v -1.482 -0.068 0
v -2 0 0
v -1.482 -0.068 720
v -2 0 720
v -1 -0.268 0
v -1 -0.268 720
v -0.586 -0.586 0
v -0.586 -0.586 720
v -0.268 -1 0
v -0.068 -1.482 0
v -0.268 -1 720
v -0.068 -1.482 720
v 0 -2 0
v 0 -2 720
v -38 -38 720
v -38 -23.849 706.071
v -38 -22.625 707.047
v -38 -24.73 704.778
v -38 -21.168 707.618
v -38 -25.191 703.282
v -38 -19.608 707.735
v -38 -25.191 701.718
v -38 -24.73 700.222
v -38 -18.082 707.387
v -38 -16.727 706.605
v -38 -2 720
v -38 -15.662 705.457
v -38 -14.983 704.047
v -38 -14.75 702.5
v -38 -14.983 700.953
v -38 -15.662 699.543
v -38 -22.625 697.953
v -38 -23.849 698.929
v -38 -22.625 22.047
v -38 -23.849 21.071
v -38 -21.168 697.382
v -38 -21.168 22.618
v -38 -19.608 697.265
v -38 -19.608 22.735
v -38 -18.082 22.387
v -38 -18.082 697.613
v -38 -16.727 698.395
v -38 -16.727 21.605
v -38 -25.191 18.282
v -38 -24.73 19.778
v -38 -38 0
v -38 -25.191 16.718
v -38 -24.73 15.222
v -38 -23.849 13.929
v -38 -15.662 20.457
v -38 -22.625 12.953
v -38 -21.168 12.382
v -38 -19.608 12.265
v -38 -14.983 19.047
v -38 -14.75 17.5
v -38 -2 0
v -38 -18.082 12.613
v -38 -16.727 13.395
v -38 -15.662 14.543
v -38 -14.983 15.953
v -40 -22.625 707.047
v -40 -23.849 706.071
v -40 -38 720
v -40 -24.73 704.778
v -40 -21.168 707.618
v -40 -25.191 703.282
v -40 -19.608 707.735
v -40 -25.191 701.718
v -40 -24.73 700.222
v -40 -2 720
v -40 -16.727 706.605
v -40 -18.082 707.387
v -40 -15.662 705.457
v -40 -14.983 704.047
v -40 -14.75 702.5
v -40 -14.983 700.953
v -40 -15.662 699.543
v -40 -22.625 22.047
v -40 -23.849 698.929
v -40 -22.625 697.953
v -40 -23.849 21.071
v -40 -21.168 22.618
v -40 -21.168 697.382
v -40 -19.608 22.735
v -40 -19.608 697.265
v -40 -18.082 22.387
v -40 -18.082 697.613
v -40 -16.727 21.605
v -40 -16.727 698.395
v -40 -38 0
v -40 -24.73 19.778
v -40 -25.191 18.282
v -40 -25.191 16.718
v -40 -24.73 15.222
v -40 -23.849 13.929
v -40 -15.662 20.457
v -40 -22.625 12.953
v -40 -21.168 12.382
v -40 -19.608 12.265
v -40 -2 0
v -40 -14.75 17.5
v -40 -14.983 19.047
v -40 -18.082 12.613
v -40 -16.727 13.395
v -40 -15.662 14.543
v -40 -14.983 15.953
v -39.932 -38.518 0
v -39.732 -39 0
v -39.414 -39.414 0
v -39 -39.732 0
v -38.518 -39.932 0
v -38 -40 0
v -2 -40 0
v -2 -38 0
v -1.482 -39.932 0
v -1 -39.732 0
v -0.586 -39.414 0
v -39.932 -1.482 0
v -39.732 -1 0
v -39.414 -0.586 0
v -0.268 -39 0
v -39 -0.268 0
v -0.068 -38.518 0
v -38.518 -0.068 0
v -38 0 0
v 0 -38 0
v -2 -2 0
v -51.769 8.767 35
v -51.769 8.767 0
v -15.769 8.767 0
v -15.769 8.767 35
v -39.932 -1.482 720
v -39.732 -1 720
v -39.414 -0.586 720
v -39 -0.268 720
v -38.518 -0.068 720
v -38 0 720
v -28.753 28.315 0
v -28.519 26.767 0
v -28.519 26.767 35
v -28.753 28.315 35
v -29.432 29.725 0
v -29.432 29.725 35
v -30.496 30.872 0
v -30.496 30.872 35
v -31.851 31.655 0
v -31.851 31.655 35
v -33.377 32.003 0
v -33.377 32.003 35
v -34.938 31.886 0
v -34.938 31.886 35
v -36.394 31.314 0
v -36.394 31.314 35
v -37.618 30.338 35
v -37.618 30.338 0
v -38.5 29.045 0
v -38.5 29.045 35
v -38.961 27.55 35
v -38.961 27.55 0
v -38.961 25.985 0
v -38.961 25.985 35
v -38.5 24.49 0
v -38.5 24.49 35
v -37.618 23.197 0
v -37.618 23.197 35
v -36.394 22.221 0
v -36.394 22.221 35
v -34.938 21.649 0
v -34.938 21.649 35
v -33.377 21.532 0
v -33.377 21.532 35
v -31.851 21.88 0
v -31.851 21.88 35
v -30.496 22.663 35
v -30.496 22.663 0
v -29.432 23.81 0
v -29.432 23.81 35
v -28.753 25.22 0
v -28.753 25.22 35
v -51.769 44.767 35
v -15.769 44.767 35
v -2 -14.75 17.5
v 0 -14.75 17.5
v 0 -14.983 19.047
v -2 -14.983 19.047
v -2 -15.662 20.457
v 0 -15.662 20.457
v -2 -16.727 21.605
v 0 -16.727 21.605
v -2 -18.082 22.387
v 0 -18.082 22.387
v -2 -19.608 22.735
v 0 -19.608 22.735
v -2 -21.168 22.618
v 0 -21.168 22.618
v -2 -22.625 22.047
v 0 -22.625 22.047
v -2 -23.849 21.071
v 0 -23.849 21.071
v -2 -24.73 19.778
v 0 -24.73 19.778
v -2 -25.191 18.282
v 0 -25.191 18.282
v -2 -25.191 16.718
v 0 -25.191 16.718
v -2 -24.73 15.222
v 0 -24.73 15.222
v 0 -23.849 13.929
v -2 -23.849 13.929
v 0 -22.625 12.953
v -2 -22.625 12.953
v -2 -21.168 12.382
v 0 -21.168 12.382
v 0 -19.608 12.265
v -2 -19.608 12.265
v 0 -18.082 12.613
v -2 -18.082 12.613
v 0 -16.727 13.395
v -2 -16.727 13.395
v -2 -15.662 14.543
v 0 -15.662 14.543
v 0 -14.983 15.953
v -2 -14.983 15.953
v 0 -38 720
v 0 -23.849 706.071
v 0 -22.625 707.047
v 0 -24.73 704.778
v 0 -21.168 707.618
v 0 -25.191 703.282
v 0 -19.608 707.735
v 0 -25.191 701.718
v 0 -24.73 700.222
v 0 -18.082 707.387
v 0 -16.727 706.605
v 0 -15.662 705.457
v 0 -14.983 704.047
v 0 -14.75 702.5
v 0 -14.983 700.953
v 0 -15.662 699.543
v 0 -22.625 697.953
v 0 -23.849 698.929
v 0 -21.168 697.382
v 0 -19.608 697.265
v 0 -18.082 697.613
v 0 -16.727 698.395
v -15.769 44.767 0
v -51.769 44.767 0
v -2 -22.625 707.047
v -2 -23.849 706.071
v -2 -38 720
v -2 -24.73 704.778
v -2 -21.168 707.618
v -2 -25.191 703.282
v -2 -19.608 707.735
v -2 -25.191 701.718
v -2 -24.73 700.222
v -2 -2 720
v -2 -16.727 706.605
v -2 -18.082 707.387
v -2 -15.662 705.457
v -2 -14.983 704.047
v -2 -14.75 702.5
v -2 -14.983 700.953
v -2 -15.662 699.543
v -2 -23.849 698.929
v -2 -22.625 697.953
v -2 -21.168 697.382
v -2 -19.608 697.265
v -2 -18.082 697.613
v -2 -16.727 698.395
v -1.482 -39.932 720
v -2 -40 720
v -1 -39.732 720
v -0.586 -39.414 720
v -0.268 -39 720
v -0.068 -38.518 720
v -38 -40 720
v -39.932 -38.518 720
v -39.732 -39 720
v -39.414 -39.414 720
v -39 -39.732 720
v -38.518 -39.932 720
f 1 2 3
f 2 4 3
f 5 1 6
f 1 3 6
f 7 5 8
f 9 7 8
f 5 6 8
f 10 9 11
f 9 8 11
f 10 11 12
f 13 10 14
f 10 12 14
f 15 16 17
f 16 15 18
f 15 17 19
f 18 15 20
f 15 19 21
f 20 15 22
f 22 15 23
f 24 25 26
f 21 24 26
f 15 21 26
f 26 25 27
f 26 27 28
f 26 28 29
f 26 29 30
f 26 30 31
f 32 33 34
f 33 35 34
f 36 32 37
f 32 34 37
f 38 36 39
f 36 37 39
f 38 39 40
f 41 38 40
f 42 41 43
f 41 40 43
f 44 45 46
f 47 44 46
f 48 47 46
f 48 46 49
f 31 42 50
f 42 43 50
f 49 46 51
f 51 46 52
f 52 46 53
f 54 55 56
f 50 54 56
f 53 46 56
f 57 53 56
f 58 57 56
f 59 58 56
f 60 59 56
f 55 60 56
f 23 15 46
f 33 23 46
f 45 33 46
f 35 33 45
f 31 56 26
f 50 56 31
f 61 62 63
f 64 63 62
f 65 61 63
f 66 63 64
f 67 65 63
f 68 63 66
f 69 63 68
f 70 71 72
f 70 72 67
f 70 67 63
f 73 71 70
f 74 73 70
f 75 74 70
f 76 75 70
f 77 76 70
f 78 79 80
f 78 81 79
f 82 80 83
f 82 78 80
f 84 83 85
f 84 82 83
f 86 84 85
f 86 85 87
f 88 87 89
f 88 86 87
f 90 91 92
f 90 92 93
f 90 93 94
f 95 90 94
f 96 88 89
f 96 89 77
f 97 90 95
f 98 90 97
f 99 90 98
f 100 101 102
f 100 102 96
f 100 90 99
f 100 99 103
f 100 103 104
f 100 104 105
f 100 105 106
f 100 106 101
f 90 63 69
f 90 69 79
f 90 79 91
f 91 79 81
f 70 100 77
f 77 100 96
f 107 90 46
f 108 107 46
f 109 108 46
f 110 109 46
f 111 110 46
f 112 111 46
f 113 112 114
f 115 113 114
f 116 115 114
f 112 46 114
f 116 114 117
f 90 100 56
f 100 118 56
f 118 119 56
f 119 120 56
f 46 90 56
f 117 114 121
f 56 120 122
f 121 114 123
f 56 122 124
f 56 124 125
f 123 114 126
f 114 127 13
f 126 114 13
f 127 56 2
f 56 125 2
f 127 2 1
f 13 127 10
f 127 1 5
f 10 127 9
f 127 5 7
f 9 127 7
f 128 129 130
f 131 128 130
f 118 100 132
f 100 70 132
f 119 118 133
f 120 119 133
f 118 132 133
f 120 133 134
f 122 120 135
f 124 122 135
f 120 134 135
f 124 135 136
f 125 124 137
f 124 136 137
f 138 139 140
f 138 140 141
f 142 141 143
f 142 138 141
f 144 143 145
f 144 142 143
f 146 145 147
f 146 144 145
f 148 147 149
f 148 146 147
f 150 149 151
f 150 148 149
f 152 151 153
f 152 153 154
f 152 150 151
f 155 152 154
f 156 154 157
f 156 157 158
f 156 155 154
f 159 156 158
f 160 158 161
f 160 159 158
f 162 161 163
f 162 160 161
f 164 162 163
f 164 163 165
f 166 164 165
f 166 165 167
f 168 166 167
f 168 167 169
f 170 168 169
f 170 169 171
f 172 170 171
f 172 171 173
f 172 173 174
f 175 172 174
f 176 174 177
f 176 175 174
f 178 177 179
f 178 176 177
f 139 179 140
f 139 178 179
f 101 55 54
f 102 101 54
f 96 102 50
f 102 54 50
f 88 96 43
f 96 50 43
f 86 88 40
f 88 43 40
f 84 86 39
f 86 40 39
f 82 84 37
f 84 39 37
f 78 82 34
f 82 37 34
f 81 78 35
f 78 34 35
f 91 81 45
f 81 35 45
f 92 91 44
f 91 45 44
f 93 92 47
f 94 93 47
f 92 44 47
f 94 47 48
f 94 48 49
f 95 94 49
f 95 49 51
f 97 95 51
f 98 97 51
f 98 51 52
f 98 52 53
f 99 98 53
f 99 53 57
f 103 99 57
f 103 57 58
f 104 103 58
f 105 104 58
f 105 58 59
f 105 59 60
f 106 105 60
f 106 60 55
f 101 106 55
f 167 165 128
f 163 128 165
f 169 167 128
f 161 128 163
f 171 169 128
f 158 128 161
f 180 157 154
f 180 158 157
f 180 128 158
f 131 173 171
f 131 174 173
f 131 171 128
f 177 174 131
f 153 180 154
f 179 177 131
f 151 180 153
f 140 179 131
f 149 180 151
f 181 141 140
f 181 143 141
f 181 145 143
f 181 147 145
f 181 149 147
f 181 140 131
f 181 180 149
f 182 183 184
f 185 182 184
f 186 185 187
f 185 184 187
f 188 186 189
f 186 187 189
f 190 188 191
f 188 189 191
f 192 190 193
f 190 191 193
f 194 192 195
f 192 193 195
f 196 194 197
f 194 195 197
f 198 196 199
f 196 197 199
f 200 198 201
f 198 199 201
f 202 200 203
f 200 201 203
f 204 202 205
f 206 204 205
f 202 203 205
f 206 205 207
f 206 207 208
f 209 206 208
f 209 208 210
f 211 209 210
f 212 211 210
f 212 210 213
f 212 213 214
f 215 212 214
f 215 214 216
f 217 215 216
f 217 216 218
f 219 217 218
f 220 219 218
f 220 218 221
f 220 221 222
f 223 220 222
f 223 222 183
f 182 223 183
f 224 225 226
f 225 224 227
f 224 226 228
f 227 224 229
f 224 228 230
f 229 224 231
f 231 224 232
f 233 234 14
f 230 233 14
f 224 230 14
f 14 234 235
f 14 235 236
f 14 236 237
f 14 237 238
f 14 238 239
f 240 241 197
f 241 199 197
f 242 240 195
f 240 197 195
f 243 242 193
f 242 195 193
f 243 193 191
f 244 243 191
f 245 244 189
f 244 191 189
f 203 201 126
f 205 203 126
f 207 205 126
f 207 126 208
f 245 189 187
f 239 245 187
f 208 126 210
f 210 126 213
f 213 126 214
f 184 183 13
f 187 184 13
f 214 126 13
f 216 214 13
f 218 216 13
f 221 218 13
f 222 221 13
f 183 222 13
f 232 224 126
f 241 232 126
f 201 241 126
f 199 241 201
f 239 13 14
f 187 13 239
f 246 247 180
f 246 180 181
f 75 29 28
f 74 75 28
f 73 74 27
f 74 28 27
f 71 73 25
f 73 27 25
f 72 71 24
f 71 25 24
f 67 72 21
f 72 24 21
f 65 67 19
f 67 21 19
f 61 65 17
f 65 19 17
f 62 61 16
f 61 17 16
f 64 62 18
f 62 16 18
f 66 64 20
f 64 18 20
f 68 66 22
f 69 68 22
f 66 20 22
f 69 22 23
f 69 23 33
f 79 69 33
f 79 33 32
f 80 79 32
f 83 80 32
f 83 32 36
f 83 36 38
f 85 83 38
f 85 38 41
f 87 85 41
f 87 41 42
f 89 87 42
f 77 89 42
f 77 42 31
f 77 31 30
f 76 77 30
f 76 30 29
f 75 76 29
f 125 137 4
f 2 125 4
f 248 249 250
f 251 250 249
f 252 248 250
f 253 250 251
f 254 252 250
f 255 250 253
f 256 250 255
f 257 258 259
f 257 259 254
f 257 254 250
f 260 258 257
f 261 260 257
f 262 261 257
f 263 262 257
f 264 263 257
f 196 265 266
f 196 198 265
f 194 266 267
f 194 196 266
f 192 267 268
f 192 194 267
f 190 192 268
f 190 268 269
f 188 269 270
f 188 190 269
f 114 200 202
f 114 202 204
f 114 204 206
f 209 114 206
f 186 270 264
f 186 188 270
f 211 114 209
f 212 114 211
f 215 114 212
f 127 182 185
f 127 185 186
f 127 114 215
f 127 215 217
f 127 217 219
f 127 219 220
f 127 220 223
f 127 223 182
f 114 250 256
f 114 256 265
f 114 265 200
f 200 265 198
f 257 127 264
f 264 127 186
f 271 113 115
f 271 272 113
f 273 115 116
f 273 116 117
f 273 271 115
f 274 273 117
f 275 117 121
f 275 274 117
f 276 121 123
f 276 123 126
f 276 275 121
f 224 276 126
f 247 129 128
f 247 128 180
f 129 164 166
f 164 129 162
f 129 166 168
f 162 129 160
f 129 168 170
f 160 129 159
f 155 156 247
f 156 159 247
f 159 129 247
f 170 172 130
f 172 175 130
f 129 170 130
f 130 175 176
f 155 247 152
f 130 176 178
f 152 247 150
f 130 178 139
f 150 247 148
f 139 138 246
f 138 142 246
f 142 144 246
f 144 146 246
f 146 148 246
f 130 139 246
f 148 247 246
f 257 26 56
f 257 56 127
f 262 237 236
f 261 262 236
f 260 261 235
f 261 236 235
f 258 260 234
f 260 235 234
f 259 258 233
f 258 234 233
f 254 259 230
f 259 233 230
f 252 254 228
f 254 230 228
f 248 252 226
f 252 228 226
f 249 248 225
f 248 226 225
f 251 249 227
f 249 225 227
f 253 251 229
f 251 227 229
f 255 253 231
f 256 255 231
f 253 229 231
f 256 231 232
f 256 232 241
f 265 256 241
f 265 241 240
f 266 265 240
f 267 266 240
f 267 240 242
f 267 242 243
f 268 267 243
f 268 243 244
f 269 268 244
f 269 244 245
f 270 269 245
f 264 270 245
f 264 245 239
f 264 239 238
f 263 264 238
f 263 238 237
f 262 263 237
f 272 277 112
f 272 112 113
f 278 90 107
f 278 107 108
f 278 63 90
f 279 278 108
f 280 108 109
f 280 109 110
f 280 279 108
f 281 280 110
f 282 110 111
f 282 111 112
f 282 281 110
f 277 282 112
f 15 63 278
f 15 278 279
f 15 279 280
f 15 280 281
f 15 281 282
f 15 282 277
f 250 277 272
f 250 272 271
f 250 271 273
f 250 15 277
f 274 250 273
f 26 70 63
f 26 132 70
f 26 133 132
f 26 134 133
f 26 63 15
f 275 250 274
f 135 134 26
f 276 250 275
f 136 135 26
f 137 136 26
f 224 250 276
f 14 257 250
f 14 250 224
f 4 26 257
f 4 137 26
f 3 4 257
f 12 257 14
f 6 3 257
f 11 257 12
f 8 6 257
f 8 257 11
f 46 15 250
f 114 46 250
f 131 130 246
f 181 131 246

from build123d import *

# Parameters (mm, degrees)
F0_W     = 40
F0_H     = 40
F0_W_2   = 36
F0_H_2   = 36
F1_DEPTH = 720
F2_W     = 36
F2_H     = 36
F2_R     = 5.25
F3_DEPTH = 35
F5_D     = 10.5
F7_D     = 10.5
F8_R     = 2


with BuildPart() as f1:
    # F0 (on Top) → F1 (new body)
    with BuildSketch(Plane.XY):
        with Locations((-20, -20)):
            Rectangle(F0_W, F0_H)
        with Locations((-20, -20)):
            Rectangle(F0_W_2, F0_H_2, mode=Mode.SUBTRACT)
    extrude(amount=F1_DEPTH)

    # F5 (through all)
    with Locations(Plane(origin=(-40, 0, 0), x_dir=(0, -1, 0), z_dir=(-1, 0, 0))):
        with Locations((20, 17.5)):
            Hole(F5_D / 2)

    # F7 (through all)
    with Locations(Plane(origin=(-40, 0, 0), x_dir=(0, -1, 0), z_dir=(-1, 0, 0))):
        with Locations((20, 702.5)):
            Hole(F7_D / 2)

    # F8
    f8_edges = [f1.edges().sort_by_distance(p)[0] for p in [
        (0, -40, 360),
        (0, 0, 360),
        (-40, -40, 360),
        (-40, 0, 360),
    ]]
    fillet(f8_edges, radius=F8_R)


with BuildPart() as f3:
    # F2 (on Top) → F3 (new body)
    with BuildSketch(Plane.XY):
        with Locations((-33.769461, 26.767461)):
            Rectangle(F2_W, F2_H)
        with Locations((-33.769461, 26.767461)):
            Circle(F2_R, mode=Mode.SUBTRACT)
    extrude(amount=F3_DEPTH)


solid = Compound([f1.part, f3.part])
